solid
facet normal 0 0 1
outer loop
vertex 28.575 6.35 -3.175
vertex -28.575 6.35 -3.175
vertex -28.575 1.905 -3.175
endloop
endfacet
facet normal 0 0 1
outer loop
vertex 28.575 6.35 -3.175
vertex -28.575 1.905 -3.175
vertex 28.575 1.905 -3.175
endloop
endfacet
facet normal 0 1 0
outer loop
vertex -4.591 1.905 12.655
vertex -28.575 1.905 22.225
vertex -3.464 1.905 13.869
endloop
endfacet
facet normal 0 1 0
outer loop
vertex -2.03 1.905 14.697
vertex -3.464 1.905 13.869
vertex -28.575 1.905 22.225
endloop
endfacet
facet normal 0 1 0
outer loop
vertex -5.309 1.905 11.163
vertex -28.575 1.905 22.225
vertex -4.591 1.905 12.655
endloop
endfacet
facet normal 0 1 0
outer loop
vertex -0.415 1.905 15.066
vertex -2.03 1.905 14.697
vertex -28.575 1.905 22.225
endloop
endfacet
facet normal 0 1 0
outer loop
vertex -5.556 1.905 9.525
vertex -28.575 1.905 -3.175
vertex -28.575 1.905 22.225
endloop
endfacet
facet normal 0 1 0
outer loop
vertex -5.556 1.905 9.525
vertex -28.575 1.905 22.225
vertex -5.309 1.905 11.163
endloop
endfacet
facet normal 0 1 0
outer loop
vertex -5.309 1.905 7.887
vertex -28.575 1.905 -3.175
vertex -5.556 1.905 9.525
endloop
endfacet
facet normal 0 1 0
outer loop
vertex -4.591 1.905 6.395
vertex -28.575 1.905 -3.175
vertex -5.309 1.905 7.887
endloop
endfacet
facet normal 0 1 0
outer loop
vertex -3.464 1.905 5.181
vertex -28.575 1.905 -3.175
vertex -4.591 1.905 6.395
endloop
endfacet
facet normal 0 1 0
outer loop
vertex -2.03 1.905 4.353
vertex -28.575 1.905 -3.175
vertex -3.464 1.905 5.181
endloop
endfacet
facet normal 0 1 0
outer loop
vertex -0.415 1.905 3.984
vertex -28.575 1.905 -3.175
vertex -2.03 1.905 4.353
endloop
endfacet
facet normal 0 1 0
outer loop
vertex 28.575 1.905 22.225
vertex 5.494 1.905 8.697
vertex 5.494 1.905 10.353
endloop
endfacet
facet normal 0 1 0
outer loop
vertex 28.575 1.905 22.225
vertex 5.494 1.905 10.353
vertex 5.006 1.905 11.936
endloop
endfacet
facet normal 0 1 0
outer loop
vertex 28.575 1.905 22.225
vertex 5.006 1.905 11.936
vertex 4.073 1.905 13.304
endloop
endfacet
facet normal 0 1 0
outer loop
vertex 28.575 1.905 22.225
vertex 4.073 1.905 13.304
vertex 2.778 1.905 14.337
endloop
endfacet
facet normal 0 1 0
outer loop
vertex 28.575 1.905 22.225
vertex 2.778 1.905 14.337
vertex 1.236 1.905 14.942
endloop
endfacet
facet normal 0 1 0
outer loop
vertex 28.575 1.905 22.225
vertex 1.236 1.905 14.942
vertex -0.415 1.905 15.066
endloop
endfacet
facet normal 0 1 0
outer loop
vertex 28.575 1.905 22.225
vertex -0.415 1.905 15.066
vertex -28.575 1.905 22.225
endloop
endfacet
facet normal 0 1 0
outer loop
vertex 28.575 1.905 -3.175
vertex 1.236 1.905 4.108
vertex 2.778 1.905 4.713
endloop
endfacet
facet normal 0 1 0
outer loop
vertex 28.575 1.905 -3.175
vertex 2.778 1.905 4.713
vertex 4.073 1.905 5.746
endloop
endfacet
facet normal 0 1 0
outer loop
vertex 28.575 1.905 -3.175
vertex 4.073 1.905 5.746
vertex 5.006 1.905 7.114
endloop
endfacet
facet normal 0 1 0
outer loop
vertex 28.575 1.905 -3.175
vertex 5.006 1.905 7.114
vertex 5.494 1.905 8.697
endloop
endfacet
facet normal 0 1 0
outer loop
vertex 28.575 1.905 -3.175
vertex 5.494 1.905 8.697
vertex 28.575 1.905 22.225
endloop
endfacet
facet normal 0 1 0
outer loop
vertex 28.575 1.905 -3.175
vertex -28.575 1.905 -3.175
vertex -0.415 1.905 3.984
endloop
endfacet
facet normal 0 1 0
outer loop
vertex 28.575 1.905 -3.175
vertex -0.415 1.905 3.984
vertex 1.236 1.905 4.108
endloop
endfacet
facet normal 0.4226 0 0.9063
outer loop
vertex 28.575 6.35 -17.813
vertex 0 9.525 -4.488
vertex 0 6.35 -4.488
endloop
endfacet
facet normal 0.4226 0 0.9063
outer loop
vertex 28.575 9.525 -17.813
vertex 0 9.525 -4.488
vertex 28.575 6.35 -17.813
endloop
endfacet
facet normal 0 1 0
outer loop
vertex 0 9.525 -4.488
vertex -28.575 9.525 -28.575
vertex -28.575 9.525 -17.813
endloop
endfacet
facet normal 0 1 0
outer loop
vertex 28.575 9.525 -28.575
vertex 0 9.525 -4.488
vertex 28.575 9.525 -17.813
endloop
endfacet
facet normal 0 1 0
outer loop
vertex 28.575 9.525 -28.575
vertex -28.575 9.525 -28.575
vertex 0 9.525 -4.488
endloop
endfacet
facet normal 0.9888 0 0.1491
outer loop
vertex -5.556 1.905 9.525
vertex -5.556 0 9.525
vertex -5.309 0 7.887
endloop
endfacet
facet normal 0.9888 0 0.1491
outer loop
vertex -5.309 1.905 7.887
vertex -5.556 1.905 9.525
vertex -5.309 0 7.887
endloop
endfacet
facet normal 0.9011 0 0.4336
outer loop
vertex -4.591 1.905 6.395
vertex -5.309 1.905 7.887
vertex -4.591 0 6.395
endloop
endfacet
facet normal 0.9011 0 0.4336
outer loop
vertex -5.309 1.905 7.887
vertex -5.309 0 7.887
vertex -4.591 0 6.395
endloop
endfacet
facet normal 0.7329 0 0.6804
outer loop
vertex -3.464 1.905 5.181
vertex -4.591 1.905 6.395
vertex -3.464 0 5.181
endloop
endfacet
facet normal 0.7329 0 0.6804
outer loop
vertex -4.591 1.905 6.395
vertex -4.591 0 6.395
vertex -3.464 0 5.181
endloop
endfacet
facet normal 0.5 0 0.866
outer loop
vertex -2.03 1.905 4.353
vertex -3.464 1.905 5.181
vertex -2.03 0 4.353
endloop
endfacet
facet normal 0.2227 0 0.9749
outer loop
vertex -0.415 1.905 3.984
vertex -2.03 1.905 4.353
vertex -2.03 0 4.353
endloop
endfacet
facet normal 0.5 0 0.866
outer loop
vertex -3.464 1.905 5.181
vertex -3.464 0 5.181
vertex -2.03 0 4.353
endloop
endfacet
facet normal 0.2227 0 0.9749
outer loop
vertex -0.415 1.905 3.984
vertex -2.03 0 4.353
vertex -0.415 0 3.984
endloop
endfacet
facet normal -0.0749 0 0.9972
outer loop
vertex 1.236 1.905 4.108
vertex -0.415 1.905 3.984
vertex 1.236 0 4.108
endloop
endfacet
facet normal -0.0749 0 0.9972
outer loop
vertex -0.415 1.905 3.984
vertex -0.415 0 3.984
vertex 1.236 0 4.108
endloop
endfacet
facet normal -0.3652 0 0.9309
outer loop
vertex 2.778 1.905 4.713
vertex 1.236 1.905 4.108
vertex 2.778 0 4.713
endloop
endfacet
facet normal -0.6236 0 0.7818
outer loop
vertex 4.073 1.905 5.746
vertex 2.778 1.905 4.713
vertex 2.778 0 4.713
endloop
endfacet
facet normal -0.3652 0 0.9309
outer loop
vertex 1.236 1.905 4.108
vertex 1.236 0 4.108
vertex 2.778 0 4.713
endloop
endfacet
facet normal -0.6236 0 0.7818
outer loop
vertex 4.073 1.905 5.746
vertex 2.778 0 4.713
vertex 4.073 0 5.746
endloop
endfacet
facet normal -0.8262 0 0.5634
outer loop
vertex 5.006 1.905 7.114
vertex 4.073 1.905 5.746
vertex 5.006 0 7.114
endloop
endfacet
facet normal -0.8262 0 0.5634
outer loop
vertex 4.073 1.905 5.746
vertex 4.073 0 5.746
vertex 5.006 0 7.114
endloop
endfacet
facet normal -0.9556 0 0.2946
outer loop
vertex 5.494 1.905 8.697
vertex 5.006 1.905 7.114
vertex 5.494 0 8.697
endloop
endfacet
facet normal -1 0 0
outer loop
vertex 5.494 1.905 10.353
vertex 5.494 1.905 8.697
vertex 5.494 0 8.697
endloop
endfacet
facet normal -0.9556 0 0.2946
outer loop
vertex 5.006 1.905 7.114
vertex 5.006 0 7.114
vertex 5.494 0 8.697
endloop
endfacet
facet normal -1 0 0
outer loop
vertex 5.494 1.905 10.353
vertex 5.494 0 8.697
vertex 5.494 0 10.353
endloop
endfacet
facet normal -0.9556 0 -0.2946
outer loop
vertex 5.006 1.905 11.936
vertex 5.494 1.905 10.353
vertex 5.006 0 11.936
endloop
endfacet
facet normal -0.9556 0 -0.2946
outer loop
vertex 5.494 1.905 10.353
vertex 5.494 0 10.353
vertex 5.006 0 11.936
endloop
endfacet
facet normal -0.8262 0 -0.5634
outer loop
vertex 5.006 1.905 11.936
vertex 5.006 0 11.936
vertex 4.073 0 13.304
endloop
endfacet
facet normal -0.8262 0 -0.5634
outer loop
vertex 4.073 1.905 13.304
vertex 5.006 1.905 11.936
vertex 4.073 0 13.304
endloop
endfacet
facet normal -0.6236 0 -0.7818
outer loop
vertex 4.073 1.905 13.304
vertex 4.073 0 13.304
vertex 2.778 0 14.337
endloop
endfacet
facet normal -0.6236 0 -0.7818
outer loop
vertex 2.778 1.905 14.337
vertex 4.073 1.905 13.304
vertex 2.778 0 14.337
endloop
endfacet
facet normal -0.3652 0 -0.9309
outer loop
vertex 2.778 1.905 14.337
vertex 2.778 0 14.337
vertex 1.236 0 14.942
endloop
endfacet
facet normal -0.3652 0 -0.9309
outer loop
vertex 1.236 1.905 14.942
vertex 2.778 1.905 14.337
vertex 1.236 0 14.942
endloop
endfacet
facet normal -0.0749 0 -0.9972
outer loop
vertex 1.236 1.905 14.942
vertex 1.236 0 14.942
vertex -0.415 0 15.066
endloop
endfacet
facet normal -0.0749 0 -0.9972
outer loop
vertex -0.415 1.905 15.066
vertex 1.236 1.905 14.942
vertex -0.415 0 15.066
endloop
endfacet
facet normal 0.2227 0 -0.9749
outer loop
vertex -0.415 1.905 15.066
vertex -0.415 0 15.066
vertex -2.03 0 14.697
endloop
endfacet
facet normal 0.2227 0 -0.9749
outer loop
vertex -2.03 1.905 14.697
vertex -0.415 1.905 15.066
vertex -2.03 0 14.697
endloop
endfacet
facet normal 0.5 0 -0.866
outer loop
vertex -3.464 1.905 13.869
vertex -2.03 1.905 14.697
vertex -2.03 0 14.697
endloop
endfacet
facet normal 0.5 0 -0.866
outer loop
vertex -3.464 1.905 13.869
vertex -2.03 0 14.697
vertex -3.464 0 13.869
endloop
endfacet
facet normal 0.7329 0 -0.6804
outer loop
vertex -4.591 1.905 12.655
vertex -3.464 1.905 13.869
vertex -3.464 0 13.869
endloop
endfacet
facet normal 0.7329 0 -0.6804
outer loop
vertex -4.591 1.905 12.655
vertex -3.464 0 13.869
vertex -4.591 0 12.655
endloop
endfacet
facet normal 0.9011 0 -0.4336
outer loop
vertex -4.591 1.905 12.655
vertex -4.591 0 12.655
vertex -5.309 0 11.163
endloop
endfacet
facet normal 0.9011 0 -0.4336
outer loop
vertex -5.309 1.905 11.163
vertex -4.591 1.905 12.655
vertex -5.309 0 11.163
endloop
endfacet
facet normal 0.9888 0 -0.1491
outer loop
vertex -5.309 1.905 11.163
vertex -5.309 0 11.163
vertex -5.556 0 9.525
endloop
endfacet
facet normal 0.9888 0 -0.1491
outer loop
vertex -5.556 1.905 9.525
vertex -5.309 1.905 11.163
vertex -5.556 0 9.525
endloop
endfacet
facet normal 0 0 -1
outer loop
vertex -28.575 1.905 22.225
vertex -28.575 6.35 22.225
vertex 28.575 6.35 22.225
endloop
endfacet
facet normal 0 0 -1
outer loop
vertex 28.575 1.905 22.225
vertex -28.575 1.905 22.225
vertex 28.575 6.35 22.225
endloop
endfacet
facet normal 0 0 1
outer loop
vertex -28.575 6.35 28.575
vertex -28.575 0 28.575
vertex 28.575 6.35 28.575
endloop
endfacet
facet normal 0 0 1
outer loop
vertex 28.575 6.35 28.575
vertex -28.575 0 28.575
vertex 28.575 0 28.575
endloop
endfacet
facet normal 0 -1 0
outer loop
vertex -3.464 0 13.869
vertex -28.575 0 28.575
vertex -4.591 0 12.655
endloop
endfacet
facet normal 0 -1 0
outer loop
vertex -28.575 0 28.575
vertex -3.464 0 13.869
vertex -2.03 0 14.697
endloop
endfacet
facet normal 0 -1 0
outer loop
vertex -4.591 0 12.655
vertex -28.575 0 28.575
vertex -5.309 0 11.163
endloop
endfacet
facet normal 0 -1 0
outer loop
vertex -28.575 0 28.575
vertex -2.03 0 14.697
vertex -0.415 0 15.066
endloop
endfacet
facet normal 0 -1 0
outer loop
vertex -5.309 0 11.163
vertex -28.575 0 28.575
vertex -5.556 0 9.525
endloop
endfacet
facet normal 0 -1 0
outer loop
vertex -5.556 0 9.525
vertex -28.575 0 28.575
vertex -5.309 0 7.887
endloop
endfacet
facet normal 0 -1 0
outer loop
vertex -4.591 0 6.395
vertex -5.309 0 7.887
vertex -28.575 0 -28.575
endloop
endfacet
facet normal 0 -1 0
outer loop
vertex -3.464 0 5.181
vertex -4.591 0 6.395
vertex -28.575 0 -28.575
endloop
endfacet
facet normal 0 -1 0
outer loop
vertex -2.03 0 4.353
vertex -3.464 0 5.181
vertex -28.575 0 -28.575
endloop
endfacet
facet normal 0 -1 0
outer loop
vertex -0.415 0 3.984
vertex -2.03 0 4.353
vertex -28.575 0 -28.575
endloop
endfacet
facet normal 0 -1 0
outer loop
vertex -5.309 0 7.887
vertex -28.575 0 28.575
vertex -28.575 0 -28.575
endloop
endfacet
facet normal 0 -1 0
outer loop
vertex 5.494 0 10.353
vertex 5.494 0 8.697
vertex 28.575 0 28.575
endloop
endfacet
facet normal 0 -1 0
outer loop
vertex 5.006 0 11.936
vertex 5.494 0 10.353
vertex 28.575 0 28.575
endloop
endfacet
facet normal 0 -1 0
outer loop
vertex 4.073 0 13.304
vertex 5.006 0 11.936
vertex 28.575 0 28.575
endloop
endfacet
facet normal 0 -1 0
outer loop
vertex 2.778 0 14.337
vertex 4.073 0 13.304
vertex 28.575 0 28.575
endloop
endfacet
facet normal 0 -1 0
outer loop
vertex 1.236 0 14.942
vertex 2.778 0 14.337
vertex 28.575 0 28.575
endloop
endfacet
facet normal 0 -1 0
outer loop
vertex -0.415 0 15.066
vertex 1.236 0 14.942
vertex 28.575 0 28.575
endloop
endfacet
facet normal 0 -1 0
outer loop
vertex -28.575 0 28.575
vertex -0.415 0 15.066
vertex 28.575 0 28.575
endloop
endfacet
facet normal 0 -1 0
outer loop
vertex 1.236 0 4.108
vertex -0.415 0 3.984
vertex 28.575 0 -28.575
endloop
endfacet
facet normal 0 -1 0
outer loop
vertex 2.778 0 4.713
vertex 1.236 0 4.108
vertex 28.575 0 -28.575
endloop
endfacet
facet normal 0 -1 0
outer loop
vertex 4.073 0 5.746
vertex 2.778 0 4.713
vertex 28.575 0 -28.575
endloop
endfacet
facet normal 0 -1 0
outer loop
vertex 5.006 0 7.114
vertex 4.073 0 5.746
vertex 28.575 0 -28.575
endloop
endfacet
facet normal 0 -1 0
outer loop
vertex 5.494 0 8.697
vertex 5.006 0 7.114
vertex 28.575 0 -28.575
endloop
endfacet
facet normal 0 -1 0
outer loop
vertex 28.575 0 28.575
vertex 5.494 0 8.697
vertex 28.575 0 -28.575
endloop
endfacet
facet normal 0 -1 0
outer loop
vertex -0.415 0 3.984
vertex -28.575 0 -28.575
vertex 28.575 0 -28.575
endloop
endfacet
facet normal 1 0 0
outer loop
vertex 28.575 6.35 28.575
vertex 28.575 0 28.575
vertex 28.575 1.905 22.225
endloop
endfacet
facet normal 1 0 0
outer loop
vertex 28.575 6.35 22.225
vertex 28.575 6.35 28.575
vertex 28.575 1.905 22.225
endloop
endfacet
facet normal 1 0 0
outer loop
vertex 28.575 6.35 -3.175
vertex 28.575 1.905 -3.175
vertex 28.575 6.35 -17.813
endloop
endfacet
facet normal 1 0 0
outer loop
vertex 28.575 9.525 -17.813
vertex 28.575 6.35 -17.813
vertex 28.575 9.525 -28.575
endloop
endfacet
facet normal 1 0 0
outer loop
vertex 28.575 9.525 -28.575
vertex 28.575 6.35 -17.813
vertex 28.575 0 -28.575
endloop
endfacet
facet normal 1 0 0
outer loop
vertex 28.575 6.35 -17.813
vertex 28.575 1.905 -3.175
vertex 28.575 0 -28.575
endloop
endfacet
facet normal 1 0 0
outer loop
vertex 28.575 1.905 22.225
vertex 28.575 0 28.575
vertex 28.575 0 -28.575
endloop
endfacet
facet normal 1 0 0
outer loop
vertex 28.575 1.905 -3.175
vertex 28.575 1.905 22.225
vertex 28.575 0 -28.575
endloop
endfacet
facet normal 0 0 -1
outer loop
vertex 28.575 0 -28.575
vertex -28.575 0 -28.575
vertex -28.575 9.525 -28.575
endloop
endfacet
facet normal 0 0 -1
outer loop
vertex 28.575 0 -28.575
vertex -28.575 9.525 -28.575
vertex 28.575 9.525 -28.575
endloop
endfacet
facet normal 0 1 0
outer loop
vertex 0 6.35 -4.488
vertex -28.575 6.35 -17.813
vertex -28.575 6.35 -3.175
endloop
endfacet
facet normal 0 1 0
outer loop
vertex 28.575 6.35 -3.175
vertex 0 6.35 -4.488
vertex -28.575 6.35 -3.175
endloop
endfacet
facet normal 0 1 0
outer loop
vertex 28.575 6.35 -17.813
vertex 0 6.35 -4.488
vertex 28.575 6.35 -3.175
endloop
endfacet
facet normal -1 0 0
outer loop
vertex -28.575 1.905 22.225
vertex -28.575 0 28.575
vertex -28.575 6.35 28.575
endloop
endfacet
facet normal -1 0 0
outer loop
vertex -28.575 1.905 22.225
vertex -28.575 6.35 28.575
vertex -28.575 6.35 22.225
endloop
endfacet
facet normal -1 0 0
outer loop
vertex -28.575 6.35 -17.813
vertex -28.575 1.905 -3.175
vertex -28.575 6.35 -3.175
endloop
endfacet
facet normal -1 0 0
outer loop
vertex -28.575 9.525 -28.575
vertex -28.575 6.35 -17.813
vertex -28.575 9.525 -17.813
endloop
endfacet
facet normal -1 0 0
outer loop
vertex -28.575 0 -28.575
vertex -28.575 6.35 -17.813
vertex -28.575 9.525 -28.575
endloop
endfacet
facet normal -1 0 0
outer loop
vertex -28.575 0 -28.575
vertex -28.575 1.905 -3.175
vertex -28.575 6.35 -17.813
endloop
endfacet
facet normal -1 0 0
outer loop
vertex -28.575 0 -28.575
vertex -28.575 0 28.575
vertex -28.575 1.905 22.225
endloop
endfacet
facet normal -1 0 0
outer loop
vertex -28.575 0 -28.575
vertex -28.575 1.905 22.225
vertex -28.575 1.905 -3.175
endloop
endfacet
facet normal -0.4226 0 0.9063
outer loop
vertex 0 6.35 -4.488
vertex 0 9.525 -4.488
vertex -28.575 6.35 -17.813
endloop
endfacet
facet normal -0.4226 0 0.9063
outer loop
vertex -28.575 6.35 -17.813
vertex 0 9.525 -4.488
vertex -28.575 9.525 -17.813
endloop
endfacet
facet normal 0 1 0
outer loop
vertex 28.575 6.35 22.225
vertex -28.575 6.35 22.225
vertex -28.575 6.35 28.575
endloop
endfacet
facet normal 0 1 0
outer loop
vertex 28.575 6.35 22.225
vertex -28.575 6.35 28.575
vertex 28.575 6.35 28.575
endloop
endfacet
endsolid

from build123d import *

# Parameters (mm, degrees)
SKETCH1_W                          = 57.15
SKETCH1_H                          = 57.15
BOSS_EXTRUDE1_DEPTH                = 9.525
SKETCH2_W                          = 57.15
SKETCH2_H                          = 25.4
CUT_EXTRUDE1_DEPTH                 = 7.62
F_7_16_0_4375_DIAMETER_HOLE1_D     = 11.1125
F_7_16_0_4375_DIAMETER_HOLE1_DEPTH = 25.4
F_7_16_0_4375_DIAMETER_HOLE1_TIP   = 3.338531814
CUT_EXTRUDE3_DEPTH                 = 3.175
SKETCH9_W                          = 57.15
SKETCH9_H                          = 6.35
CUT_EXTRUDE4_DEPTH                 = 3.175


with BuildPart() as part:
    # Sketch1 → Boss-Extrude1 (new body)
    with BuildSketch(Plane(origin=(0, 0, 0), x_dir=(1, 0, 0), z_dir=(0, 1, 0))):
        Rectangle(SKETCH1_W, SKETCH1_H)
    extrude(amount=BOSS_EXTRUDE1_DEPTH)

    # Sketch2 → Cut-Extrude1 (cut)
    with BuildSketch(Plane(origin=(0, 9.525, 0), x_dir=(1, 0, 0), z_dir=(0, 1, 0))):
        with Locations((0, -9.525)):
            Rectangle(SKETCH2_W, SKETCH2_H)
    extrude(amount=-CUT_EXTRUDE1_DEPTH, mode=Mode.SUBTRACT)

    # 7/16 (0.4375) Diameter Hole1
    with Locations(Plane(origin=(0, 1.905, 0), x_dir=(1, 0, 0), z_dir=(0, 1, 0))):
        with Locations((0, -9.525)):
            Hole(F_7_16_0_4375_DIAMETER_HOLE1_D / 2, depth=F_7_16_0_4375_DIAMETER_HOLE1_DEPTH)
            with Locations((0, 0, -(F_7_16_0_4375_DIAMETER_HOLE1_DEPTH + F_7_16_0_4375_DIAMETER_HOLE1_TIP / 2))):  # 118° drill point
                Cone(0, F_7_16_0_4375_DIAMETER_HOLE1_D / 2, F_7_16_0_4375_DIAMETER_HOLE1_TIP, mode=Mode.SUBTRACT)

    # Sketch8 → Cut-Extrude3 (cut)
    with BuildSketch(Plane(origin=(0, 9.525, 0), x_dir=(1, 0, 0), z_dir=(0, 1, 0))):
        Polygon((0, 4.487899571), (28.575, 17.812640903), (28.575, 3.175), (0, 3.175), align=None)
    cut_extrude3 = extrude(amount=-CUT_EXTRUDE3_DEPTH, mode=Mode.SUBTRACT)

    # Mirror2: Cut-Extrude3 across plane
    add(cut_extrude3.mirror(Plane(origin=(0, 0, 0), x_dir=(0, 0, 1), z_dir=(1, 0, 0))), mode=Mode.SUBTRACT)

    # Sketch9 → Cut-Extrude4 (cut)
    with BuildSketch(Plane(origin=(0, 9.525, 0), x_dir=(1, 0, 0), z_dir=(0, 1, 0))):
        with Locations((0, -25.4)):
            Rectangle(SKETCH9_W, SKETCH9_H)
    extrude(amount=-CUT_EXTRUDE4_DEPTH, mode=Mode.SUBTRACT)


solid = part.part
